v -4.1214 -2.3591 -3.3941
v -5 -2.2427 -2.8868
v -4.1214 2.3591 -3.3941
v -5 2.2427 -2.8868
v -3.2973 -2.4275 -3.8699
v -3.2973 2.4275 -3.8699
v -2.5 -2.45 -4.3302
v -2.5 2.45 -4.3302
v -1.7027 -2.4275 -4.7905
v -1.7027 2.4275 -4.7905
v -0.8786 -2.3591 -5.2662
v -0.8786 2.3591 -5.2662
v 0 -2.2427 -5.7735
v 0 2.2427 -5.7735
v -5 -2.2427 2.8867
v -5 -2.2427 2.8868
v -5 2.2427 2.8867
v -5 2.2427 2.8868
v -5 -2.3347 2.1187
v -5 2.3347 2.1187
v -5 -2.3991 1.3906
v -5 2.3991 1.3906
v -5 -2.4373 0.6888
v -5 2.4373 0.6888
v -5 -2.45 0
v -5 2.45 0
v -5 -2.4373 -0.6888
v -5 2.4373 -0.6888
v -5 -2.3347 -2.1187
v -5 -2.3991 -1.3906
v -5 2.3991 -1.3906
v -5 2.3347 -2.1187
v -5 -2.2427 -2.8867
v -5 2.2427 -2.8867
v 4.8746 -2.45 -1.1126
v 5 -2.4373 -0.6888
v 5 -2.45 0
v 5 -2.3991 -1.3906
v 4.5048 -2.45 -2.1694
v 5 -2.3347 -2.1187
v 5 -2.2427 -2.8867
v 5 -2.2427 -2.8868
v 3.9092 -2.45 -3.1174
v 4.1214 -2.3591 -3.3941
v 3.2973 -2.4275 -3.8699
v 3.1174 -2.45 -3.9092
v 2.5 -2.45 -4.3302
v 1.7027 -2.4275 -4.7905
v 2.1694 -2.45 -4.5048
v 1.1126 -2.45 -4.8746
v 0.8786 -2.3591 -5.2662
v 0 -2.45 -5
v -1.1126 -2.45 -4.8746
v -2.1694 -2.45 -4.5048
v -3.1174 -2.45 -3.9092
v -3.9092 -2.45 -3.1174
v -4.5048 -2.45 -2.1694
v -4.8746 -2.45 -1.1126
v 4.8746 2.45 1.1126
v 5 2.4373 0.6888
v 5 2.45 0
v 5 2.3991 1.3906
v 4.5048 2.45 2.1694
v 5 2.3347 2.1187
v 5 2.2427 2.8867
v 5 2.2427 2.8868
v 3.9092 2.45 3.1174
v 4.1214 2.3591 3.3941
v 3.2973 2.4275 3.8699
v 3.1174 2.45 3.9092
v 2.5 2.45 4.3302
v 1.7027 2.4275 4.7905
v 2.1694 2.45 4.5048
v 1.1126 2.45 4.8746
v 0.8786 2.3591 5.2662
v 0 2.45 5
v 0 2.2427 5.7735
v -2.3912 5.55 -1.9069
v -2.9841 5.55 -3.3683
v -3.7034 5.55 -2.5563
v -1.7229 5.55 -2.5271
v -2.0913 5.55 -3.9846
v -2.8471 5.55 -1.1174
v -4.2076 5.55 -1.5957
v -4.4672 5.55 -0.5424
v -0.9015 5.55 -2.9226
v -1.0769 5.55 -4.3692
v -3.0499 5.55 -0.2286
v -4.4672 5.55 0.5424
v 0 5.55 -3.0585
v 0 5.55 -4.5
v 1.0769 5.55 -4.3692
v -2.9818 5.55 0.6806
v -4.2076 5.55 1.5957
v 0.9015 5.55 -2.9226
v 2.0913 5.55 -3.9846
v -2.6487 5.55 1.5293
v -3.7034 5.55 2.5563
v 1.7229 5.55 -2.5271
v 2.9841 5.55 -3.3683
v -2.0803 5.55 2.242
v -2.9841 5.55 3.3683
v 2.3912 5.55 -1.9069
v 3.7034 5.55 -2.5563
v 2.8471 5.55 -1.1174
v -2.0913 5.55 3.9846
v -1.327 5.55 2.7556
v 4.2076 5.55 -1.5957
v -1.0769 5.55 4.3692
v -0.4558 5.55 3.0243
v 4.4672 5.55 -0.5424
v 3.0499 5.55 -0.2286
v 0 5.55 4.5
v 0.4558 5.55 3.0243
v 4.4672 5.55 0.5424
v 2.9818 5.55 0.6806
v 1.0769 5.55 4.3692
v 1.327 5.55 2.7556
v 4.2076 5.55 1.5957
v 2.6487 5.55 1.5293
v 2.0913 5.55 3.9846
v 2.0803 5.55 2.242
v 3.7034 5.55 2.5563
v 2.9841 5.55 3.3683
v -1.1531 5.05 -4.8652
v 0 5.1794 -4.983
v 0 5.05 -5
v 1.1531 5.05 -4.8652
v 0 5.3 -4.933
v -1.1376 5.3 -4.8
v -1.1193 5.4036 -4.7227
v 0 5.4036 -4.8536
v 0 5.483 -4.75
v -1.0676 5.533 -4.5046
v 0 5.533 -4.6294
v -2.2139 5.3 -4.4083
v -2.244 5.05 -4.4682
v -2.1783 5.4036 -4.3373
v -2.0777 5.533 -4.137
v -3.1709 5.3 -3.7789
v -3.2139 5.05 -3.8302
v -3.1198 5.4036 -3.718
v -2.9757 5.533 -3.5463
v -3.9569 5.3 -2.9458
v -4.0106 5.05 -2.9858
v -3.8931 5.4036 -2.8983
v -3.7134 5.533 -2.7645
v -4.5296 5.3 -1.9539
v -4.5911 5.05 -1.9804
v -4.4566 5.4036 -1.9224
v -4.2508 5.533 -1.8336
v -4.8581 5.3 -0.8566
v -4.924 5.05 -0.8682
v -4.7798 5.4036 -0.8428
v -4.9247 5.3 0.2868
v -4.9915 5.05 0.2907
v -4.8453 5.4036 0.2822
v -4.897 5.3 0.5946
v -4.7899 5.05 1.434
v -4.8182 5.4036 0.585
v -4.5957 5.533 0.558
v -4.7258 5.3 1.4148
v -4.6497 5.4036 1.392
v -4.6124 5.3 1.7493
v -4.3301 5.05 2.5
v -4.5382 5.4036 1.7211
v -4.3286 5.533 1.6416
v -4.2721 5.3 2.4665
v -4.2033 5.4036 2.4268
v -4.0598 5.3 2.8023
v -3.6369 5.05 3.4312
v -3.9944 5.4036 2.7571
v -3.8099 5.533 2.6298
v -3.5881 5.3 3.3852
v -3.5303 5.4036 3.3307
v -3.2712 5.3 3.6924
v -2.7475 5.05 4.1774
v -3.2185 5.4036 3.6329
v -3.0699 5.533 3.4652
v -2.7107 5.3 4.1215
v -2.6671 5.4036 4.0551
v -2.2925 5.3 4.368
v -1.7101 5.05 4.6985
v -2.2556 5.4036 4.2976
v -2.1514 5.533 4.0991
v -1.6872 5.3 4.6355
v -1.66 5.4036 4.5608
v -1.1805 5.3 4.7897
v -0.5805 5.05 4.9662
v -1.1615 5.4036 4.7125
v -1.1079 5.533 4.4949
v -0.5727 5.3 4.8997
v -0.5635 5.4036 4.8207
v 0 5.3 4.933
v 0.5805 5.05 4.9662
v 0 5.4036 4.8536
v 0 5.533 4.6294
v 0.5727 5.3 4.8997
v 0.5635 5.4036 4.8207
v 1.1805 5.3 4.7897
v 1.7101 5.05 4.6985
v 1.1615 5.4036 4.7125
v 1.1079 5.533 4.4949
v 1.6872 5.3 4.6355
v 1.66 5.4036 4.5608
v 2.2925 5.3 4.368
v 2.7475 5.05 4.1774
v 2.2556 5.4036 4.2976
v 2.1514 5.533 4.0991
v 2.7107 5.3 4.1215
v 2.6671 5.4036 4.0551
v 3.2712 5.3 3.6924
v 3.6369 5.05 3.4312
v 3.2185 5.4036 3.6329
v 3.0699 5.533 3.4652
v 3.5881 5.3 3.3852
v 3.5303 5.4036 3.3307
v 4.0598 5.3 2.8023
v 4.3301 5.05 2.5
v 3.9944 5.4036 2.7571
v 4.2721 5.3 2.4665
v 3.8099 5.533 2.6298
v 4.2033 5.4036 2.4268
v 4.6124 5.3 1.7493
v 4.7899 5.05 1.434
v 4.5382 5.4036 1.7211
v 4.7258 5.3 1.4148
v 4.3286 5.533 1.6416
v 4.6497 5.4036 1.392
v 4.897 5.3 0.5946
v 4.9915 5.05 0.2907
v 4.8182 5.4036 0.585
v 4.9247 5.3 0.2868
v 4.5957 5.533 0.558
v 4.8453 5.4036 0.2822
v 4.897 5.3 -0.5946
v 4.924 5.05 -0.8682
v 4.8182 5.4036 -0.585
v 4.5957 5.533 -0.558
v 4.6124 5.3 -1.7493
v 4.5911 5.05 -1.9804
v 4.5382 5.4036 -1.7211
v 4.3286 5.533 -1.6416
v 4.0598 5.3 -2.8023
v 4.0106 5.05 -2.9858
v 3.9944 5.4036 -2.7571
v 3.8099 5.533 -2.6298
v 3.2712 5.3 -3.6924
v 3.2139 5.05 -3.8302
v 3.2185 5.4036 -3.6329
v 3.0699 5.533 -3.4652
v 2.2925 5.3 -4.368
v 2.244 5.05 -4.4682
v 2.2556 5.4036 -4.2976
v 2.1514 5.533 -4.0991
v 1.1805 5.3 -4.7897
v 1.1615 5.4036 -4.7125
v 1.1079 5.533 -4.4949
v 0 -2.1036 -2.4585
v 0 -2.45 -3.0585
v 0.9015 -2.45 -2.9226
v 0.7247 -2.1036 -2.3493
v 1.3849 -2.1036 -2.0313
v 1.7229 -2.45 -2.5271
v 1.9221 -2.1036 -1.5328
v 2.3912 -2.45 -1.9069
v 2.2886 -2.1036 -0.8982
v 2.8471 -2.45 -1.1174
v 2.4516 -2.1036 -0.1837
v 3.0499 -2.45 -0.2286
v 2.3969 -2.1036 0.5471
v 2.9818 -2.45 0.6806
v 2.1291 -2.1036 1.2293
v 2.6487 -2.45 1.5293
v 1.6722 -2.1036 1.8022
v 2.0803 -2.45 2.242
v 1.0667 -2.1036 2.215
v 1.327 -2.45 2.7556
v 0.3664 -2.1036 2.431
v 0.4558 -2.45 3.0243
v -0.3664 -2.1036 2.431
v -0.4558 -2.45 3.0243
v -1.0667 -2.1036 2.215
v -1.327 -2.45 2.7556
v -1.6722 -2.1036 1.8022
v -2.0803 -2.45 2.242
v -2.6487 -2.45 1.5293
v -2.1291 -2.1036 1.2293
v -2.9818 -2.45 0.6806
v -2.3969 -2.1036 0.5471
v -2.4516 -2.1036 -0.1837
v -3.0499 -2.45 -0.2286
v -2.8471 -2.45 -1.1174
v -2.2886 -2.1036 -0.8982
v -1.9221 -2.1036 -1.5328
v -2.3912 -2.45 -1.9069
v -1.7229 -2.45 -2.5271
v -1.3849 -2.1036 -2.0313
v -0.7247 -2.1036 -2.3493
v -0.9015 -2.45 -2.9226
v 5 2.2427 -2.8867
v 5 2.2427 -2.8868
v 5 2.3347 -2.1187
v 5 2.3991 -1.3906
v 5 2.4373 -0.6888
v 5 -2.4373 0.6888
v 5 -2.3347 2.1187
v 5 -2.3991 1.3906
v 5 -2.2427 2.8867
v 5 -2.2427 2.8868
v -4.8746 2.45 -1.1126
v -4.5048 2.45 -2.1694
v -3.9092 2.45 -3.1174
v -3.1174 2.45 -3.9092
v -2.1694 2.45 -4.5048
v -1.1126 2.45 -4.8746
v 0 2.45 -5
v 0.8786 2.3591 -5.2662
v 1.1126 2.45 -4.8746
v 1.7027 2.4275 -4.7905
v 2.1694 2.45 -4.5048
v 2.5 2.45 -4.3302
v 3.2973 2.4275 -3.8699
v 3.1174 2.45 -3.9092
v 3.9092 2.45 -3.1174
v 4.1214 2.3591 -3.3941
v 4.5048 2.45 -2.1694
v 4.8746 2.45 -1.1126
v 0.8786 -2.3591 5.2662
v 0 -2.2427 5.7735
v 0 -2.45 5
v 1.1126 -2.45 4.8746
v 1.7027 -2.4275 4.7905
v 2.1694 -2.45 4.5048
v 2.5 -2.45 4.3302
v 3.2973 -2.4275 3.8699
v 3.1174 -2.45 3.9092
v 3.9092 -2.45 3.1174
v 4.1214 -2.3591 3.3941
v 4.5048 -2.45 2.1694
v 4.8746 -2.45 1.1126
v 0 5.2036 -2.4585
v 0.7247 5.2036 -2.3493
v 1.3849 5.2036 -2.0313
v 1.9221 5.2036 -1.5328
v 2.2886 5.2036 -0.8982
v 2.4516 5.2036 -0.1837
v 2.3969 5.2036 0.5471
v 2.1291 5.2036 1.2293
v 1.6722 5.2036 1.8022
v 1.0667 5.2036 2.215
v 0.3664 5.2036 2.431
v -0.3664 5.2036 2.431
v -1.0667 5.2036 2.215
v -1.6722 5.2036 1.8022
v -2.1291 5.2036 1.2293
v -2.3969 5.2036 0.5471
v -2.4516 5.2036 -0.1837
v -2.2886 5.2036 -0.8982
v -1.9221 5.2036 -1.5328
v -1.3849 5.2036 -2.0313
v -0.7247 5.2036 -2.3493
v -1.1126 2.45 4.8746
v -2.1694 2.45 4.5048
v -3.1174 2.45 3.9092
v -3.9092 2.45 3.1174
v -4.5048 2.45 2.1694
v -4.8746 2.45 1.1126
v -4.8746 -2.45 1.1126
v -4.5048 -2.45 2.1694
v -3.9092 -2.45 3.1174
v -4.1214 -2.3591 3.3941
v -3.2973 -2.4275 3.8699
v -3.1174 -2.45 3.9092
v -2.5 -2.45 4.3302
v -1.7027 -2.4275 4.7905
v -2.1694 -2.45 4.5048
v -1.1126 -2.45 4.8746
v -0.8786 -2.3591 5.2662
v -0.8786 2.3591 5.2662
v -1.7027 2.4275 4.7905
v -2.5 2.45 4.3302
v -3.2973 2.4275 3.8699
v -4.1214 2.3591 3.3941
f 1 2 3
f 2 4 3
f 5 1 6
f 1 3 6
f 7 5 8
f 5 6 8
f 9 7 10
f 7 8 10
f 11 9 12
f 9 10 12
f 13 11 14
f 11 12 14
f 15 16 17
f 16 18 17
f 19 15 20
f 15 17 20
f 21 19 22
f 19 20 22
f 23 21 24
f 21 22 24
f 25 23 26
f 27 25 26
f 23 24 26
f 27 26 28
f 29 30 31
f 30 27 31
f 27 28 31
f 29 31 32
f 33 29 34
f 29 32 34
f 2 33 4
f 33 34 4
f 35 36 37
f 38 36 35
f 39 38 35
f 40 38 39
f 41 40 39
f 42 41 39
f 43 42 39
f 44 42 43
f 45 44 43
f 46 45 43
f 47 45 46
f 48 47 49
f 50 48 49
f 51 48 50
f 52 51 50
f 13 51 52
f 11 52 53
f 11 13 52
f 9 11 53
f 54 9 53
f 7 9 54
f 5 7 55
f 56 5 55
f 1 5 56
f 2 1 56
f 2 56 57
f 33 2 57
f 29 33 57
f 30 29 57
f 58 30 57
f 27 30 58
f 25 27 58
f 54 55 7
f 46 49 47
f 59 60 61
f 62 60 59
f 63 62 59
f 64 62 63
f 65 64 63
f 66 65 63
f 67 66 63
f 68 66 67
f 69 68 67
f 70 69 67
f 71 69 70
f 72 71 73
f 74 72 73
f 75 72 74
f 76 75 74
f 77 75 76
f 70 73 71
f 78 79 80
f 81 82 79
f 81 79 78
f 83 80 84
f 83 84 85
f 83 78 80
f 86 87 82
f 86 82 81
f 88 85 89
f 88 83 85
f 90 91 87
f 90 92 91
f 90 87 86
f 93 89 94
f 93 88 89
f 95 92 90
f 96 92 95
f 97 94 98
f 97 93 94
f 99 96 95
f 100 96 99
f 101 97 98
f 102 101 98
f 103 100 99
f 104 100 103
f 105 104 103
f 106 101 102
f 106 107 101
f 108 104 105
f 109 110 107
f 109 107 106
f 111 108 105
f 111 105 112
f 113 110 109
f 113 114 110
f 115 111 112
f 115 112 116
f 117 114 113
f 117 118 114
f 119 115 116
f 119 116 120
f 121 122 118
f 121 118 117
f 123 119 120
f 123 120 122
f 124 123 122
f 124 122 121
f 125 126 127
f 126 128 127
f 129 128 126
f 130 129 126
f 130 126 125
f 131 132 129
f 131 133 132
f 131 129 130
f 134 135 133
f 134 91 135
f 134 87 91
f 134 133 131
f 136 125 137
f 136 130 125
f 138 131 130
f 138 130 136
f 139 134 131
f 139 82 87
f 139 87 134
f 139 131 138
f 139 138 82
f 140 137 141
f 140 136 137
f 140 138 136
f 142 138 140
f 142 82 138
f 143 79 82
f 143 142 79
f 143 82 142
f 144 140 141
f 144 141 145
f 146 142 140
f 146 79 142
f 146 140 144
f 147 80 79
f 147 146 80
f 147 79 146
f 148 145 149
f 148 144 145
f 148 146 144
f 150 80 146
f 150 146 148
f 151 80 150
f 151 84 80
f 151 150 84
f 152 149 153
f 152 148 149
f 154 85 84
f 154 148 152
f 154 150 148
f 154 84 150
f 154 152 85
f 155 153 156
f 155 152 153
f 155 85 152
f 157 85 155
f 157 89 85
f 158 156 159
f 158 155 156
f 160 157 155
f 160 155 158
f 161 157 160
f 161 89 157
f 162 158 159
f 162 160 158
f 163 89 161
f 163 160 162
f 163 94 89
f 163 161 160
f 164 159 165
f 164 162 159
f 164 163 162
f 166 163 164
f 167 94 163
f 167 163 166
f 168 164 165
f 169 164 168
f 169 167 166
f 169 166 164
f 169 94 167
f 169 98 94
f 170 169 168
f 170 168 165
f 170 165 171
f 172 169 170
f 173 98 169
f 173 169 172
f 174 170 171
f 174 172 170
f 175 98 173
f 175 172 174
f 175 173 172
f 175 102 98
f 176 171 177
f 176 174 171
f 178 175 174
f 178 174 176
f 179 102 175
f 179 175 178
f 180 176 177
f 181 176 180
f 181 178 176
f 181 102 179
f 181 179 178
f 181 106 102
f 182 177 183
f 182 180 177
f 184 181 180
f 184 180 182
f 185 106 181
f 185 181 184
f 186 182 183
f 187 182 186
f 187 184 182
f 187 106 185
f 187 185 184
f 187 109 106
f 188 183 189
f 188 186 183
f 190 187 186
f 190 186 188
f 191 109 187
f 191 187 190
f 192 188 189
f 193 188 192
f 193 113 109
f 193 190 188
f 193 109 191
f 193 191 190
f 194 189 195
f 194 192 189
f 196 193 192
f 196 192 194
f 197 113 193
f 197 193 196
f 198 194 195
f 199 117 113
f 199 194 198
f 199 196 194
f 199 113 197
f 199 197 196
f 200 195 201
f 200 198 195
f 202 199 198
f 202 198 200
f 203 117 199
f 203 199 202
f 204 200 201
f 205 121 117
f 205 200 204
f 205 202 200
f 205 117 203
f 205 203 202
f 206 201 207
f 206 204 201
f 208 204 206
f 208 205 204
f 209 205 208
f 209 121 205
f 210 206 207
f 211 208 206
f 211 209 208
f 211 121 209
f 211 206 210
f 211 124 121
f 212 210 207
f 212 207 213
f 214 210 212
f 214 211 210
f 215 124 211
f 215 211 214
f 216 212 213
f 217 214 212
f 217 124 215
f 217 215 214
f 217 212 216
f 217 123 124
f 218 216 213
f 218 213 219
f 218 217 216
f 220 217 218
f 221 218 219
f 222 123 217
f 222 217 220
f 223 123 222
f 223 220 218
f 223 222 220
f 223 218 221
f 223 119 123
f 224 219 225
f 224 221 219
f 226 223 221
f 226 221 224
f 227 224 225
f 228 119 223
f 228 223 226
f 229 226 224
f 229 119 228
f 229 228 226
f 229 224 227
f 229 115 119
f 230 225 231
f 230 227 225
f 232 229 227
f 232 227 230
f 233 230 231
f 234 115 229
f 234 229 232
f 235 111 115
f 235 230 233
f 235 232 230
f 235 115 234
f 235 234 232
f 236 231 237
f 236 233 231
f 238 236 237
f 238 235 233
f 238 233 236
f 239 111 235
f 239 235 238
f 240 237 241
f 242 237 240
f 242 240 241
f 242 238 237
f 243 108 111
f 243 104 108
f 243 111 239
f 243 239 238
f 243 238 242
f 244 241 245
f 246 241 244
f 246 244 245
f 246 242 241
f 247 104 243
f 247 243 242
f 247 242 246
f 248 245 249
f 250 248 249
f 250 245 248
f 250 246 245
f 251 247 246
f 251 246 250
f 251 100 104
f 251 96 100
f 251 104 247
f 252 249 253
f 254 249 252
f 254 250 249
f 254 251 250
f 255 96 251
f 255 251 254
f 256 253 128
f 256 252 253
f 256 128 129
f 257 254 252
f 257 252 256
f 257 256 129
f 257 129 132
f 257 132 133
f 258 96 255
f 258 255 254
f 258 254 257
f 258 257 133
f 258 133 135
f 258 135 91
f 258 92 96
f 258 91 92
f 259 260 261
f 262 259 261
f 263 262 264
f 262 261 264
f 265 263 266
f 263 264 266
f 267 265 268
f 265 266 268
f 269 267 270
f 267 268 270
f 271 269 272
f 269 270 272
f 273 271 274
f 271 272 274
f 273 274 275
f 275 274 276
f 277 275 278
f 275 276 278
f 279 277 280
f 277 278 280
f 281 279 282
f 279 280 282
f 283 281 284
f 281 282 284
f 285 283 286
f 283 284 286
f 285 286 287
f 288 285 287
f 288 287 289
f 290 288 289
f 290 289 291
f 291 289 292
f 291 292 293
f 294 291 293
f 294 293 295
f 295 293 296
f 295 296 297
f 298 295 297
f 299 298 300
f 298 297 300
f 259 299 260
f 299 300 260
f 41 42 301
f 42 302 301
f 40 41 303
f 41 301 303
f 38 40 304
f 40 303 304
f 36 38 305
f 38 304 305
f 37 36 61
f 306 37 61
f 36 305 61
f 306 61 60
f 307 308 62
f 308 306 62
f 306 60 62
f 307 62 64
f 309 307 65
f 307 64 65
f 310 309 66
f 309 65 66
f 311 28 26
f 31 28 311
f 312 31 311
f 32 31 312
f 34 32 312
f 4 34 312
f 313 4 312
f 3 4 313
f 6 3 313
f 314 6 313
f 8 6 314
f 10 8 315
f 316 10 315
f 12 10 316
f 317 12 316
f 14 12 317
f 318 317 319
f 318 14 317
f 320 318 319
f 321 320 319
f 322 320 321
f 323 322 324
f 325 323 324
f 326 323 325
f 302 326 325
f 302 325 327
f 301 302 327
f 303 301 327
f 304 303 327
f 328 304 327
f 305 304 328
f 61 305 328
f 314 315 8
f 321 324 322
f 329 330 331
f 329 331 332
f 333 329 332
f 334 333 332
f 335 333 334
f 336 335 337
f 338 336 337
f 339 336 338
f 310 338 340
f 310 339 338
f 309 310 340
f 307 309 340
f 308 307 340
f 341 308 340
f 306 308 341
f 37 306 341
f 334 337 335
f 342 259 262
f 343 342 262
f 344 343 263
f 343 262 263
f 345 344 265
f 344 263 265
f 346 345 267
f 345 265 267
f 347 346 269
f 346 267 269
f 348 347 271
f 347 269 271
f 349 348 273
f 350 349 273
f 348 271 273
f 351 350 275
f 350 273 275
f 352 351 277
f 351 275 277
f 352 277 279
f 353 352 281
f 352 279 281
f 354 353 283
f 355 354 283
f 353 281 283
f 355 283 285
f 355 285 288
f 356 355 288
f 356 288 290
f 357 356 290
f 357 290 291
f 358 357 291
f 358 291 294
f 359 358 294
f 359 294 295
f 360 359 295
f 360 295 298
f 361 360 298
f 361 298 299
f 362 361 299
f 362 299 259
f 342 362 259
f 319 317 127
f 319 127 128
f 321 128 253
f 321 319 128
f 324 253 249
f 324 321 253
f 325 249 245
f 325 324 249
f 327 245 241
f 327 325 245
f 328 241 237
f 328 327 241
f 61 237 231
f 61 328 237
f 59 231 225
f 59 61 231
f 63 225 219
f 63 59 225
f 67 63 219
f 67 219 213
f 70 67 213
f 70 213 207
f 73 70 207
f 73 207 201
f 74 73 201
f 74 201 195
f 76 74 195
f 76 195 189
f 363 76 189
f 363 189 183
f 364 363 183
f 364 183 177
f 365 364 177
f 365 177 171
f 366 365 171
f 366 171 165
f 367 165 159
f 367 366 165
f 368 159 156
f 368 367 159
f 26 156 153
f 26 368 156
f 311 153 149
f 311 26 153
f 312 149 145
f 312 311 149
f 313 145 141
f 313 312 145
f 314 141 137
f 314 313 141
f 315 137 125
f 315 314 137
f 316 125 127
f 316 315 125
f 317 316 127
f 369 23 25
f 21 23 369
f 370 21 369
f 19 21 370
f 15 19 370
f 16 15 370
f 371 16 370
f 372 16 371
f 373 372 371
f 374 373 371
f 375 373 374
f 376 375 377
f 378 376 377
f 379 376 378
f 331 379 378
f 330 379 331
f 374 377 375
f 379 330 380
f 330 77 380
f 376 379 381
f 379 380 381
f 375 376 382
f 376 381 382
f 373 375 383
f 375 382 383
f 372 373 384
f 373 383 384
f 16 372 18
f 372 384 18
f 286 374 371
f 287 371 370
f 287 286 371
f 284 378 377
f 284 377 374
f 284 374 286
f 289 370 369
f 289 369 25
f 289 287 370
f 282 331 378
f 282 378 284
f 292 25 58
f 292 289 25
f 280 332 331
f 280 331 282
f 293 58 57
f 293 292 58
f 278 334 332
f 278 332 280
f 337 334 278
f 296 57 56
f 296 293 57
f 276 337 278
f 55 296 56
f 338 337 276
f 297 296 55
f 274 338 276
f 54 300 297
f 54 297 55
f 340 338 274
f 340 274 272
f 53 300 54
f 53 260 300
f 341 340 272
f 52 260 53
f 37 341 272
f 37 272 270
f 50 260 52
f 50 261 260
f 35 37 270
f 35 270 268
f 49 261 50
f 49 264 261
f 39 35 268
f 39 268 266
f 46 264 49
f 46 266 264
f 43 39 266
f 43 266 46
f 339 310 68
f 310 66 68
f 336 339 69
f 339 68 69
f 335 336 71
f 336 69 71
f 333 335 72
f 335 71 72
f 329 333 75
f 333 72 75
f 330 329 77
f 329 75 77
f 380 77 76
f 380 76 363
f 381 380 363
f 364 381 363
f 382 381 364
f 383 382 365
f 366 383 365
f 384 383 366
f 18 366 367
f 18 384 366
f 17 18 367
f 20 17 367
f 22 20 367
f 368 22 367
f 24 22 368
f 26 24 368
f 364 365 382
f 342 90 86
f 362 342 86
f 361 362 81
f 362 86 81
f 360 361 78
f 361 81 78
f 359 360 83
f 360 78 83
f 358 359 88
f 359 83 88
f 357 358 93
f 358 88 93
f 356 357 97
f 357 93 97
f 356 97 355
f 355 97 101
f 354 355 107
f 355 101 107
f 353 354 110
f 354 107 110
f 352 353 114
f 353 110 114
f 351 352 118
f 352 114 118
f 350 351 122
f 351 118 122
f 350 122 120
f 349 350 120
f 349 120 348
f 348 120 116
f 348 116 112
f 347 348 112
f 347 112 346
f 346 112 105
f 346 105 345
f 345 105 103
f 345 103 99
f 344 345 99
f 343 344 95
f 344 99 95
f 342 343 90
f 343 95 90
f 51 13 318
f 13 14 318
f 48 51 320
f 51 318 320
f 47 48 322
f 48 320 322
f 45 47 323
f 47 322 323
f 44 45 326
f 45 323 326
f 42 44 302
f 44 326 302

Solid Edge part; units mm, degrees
sketch "Sketch1" plane through (0, 0, 0) normal (0, -1, 0) x (1, 0, 0)
  line L0 (5, 2.8868) -> (0, 5.7735)
  line L1 (0, 5.7735) -> (-5, 2.8868)
  line L2 (-5, 2.8868) -> (-5, -2.8868)
  line L3 (-5, -2.8868) -> (0, -5.7735)
  line L4 (0, -5.7735) -> (5, -2.8868)
  line L5 (5, -2.8868) -> (5, 2.8868)
extrude "Protrusion1" add sketch "Sketch1" along normal mid plane 4.9
sketch "Sketch2" plane through (0, 0, 0) normal (1, 0, 0) x (0, 1, 0)
  line L0 (-2.45, 5) -> (-2.2427, 5.7735)
revolve "RevolvedCutout1" cut sketch "Sketch2" angle 360 about axis through (0, 0, 0) along (0, -1, 0) material side at (0, -2.3946, 5.3997)
mirror "Mirror1" about plane through (0, 0, 0) normal (0, -1, 0) of "RevolvedCutout1"
sketch "Sketch3" plane through (0, 2.45, 0) normal (0, 1, 0) x (0, 0, -1)
  circle A0 centre (0, 0) radius 5
  dimension "D1" = 10
extrude "Protrusion2" add sketch "Sketch3" along normal blind 3.1
fillet "倒圆_2" radius 0.5 1 edges at (0, 5.55, 5)
hole "孔_7" at (0, -2.45, 0) direction (0, 1, 0) diameter 4.917 end up to next start chamfer 0.6 start chamfer angle 60 end chamfer 0.6 end chamfer angle 60
